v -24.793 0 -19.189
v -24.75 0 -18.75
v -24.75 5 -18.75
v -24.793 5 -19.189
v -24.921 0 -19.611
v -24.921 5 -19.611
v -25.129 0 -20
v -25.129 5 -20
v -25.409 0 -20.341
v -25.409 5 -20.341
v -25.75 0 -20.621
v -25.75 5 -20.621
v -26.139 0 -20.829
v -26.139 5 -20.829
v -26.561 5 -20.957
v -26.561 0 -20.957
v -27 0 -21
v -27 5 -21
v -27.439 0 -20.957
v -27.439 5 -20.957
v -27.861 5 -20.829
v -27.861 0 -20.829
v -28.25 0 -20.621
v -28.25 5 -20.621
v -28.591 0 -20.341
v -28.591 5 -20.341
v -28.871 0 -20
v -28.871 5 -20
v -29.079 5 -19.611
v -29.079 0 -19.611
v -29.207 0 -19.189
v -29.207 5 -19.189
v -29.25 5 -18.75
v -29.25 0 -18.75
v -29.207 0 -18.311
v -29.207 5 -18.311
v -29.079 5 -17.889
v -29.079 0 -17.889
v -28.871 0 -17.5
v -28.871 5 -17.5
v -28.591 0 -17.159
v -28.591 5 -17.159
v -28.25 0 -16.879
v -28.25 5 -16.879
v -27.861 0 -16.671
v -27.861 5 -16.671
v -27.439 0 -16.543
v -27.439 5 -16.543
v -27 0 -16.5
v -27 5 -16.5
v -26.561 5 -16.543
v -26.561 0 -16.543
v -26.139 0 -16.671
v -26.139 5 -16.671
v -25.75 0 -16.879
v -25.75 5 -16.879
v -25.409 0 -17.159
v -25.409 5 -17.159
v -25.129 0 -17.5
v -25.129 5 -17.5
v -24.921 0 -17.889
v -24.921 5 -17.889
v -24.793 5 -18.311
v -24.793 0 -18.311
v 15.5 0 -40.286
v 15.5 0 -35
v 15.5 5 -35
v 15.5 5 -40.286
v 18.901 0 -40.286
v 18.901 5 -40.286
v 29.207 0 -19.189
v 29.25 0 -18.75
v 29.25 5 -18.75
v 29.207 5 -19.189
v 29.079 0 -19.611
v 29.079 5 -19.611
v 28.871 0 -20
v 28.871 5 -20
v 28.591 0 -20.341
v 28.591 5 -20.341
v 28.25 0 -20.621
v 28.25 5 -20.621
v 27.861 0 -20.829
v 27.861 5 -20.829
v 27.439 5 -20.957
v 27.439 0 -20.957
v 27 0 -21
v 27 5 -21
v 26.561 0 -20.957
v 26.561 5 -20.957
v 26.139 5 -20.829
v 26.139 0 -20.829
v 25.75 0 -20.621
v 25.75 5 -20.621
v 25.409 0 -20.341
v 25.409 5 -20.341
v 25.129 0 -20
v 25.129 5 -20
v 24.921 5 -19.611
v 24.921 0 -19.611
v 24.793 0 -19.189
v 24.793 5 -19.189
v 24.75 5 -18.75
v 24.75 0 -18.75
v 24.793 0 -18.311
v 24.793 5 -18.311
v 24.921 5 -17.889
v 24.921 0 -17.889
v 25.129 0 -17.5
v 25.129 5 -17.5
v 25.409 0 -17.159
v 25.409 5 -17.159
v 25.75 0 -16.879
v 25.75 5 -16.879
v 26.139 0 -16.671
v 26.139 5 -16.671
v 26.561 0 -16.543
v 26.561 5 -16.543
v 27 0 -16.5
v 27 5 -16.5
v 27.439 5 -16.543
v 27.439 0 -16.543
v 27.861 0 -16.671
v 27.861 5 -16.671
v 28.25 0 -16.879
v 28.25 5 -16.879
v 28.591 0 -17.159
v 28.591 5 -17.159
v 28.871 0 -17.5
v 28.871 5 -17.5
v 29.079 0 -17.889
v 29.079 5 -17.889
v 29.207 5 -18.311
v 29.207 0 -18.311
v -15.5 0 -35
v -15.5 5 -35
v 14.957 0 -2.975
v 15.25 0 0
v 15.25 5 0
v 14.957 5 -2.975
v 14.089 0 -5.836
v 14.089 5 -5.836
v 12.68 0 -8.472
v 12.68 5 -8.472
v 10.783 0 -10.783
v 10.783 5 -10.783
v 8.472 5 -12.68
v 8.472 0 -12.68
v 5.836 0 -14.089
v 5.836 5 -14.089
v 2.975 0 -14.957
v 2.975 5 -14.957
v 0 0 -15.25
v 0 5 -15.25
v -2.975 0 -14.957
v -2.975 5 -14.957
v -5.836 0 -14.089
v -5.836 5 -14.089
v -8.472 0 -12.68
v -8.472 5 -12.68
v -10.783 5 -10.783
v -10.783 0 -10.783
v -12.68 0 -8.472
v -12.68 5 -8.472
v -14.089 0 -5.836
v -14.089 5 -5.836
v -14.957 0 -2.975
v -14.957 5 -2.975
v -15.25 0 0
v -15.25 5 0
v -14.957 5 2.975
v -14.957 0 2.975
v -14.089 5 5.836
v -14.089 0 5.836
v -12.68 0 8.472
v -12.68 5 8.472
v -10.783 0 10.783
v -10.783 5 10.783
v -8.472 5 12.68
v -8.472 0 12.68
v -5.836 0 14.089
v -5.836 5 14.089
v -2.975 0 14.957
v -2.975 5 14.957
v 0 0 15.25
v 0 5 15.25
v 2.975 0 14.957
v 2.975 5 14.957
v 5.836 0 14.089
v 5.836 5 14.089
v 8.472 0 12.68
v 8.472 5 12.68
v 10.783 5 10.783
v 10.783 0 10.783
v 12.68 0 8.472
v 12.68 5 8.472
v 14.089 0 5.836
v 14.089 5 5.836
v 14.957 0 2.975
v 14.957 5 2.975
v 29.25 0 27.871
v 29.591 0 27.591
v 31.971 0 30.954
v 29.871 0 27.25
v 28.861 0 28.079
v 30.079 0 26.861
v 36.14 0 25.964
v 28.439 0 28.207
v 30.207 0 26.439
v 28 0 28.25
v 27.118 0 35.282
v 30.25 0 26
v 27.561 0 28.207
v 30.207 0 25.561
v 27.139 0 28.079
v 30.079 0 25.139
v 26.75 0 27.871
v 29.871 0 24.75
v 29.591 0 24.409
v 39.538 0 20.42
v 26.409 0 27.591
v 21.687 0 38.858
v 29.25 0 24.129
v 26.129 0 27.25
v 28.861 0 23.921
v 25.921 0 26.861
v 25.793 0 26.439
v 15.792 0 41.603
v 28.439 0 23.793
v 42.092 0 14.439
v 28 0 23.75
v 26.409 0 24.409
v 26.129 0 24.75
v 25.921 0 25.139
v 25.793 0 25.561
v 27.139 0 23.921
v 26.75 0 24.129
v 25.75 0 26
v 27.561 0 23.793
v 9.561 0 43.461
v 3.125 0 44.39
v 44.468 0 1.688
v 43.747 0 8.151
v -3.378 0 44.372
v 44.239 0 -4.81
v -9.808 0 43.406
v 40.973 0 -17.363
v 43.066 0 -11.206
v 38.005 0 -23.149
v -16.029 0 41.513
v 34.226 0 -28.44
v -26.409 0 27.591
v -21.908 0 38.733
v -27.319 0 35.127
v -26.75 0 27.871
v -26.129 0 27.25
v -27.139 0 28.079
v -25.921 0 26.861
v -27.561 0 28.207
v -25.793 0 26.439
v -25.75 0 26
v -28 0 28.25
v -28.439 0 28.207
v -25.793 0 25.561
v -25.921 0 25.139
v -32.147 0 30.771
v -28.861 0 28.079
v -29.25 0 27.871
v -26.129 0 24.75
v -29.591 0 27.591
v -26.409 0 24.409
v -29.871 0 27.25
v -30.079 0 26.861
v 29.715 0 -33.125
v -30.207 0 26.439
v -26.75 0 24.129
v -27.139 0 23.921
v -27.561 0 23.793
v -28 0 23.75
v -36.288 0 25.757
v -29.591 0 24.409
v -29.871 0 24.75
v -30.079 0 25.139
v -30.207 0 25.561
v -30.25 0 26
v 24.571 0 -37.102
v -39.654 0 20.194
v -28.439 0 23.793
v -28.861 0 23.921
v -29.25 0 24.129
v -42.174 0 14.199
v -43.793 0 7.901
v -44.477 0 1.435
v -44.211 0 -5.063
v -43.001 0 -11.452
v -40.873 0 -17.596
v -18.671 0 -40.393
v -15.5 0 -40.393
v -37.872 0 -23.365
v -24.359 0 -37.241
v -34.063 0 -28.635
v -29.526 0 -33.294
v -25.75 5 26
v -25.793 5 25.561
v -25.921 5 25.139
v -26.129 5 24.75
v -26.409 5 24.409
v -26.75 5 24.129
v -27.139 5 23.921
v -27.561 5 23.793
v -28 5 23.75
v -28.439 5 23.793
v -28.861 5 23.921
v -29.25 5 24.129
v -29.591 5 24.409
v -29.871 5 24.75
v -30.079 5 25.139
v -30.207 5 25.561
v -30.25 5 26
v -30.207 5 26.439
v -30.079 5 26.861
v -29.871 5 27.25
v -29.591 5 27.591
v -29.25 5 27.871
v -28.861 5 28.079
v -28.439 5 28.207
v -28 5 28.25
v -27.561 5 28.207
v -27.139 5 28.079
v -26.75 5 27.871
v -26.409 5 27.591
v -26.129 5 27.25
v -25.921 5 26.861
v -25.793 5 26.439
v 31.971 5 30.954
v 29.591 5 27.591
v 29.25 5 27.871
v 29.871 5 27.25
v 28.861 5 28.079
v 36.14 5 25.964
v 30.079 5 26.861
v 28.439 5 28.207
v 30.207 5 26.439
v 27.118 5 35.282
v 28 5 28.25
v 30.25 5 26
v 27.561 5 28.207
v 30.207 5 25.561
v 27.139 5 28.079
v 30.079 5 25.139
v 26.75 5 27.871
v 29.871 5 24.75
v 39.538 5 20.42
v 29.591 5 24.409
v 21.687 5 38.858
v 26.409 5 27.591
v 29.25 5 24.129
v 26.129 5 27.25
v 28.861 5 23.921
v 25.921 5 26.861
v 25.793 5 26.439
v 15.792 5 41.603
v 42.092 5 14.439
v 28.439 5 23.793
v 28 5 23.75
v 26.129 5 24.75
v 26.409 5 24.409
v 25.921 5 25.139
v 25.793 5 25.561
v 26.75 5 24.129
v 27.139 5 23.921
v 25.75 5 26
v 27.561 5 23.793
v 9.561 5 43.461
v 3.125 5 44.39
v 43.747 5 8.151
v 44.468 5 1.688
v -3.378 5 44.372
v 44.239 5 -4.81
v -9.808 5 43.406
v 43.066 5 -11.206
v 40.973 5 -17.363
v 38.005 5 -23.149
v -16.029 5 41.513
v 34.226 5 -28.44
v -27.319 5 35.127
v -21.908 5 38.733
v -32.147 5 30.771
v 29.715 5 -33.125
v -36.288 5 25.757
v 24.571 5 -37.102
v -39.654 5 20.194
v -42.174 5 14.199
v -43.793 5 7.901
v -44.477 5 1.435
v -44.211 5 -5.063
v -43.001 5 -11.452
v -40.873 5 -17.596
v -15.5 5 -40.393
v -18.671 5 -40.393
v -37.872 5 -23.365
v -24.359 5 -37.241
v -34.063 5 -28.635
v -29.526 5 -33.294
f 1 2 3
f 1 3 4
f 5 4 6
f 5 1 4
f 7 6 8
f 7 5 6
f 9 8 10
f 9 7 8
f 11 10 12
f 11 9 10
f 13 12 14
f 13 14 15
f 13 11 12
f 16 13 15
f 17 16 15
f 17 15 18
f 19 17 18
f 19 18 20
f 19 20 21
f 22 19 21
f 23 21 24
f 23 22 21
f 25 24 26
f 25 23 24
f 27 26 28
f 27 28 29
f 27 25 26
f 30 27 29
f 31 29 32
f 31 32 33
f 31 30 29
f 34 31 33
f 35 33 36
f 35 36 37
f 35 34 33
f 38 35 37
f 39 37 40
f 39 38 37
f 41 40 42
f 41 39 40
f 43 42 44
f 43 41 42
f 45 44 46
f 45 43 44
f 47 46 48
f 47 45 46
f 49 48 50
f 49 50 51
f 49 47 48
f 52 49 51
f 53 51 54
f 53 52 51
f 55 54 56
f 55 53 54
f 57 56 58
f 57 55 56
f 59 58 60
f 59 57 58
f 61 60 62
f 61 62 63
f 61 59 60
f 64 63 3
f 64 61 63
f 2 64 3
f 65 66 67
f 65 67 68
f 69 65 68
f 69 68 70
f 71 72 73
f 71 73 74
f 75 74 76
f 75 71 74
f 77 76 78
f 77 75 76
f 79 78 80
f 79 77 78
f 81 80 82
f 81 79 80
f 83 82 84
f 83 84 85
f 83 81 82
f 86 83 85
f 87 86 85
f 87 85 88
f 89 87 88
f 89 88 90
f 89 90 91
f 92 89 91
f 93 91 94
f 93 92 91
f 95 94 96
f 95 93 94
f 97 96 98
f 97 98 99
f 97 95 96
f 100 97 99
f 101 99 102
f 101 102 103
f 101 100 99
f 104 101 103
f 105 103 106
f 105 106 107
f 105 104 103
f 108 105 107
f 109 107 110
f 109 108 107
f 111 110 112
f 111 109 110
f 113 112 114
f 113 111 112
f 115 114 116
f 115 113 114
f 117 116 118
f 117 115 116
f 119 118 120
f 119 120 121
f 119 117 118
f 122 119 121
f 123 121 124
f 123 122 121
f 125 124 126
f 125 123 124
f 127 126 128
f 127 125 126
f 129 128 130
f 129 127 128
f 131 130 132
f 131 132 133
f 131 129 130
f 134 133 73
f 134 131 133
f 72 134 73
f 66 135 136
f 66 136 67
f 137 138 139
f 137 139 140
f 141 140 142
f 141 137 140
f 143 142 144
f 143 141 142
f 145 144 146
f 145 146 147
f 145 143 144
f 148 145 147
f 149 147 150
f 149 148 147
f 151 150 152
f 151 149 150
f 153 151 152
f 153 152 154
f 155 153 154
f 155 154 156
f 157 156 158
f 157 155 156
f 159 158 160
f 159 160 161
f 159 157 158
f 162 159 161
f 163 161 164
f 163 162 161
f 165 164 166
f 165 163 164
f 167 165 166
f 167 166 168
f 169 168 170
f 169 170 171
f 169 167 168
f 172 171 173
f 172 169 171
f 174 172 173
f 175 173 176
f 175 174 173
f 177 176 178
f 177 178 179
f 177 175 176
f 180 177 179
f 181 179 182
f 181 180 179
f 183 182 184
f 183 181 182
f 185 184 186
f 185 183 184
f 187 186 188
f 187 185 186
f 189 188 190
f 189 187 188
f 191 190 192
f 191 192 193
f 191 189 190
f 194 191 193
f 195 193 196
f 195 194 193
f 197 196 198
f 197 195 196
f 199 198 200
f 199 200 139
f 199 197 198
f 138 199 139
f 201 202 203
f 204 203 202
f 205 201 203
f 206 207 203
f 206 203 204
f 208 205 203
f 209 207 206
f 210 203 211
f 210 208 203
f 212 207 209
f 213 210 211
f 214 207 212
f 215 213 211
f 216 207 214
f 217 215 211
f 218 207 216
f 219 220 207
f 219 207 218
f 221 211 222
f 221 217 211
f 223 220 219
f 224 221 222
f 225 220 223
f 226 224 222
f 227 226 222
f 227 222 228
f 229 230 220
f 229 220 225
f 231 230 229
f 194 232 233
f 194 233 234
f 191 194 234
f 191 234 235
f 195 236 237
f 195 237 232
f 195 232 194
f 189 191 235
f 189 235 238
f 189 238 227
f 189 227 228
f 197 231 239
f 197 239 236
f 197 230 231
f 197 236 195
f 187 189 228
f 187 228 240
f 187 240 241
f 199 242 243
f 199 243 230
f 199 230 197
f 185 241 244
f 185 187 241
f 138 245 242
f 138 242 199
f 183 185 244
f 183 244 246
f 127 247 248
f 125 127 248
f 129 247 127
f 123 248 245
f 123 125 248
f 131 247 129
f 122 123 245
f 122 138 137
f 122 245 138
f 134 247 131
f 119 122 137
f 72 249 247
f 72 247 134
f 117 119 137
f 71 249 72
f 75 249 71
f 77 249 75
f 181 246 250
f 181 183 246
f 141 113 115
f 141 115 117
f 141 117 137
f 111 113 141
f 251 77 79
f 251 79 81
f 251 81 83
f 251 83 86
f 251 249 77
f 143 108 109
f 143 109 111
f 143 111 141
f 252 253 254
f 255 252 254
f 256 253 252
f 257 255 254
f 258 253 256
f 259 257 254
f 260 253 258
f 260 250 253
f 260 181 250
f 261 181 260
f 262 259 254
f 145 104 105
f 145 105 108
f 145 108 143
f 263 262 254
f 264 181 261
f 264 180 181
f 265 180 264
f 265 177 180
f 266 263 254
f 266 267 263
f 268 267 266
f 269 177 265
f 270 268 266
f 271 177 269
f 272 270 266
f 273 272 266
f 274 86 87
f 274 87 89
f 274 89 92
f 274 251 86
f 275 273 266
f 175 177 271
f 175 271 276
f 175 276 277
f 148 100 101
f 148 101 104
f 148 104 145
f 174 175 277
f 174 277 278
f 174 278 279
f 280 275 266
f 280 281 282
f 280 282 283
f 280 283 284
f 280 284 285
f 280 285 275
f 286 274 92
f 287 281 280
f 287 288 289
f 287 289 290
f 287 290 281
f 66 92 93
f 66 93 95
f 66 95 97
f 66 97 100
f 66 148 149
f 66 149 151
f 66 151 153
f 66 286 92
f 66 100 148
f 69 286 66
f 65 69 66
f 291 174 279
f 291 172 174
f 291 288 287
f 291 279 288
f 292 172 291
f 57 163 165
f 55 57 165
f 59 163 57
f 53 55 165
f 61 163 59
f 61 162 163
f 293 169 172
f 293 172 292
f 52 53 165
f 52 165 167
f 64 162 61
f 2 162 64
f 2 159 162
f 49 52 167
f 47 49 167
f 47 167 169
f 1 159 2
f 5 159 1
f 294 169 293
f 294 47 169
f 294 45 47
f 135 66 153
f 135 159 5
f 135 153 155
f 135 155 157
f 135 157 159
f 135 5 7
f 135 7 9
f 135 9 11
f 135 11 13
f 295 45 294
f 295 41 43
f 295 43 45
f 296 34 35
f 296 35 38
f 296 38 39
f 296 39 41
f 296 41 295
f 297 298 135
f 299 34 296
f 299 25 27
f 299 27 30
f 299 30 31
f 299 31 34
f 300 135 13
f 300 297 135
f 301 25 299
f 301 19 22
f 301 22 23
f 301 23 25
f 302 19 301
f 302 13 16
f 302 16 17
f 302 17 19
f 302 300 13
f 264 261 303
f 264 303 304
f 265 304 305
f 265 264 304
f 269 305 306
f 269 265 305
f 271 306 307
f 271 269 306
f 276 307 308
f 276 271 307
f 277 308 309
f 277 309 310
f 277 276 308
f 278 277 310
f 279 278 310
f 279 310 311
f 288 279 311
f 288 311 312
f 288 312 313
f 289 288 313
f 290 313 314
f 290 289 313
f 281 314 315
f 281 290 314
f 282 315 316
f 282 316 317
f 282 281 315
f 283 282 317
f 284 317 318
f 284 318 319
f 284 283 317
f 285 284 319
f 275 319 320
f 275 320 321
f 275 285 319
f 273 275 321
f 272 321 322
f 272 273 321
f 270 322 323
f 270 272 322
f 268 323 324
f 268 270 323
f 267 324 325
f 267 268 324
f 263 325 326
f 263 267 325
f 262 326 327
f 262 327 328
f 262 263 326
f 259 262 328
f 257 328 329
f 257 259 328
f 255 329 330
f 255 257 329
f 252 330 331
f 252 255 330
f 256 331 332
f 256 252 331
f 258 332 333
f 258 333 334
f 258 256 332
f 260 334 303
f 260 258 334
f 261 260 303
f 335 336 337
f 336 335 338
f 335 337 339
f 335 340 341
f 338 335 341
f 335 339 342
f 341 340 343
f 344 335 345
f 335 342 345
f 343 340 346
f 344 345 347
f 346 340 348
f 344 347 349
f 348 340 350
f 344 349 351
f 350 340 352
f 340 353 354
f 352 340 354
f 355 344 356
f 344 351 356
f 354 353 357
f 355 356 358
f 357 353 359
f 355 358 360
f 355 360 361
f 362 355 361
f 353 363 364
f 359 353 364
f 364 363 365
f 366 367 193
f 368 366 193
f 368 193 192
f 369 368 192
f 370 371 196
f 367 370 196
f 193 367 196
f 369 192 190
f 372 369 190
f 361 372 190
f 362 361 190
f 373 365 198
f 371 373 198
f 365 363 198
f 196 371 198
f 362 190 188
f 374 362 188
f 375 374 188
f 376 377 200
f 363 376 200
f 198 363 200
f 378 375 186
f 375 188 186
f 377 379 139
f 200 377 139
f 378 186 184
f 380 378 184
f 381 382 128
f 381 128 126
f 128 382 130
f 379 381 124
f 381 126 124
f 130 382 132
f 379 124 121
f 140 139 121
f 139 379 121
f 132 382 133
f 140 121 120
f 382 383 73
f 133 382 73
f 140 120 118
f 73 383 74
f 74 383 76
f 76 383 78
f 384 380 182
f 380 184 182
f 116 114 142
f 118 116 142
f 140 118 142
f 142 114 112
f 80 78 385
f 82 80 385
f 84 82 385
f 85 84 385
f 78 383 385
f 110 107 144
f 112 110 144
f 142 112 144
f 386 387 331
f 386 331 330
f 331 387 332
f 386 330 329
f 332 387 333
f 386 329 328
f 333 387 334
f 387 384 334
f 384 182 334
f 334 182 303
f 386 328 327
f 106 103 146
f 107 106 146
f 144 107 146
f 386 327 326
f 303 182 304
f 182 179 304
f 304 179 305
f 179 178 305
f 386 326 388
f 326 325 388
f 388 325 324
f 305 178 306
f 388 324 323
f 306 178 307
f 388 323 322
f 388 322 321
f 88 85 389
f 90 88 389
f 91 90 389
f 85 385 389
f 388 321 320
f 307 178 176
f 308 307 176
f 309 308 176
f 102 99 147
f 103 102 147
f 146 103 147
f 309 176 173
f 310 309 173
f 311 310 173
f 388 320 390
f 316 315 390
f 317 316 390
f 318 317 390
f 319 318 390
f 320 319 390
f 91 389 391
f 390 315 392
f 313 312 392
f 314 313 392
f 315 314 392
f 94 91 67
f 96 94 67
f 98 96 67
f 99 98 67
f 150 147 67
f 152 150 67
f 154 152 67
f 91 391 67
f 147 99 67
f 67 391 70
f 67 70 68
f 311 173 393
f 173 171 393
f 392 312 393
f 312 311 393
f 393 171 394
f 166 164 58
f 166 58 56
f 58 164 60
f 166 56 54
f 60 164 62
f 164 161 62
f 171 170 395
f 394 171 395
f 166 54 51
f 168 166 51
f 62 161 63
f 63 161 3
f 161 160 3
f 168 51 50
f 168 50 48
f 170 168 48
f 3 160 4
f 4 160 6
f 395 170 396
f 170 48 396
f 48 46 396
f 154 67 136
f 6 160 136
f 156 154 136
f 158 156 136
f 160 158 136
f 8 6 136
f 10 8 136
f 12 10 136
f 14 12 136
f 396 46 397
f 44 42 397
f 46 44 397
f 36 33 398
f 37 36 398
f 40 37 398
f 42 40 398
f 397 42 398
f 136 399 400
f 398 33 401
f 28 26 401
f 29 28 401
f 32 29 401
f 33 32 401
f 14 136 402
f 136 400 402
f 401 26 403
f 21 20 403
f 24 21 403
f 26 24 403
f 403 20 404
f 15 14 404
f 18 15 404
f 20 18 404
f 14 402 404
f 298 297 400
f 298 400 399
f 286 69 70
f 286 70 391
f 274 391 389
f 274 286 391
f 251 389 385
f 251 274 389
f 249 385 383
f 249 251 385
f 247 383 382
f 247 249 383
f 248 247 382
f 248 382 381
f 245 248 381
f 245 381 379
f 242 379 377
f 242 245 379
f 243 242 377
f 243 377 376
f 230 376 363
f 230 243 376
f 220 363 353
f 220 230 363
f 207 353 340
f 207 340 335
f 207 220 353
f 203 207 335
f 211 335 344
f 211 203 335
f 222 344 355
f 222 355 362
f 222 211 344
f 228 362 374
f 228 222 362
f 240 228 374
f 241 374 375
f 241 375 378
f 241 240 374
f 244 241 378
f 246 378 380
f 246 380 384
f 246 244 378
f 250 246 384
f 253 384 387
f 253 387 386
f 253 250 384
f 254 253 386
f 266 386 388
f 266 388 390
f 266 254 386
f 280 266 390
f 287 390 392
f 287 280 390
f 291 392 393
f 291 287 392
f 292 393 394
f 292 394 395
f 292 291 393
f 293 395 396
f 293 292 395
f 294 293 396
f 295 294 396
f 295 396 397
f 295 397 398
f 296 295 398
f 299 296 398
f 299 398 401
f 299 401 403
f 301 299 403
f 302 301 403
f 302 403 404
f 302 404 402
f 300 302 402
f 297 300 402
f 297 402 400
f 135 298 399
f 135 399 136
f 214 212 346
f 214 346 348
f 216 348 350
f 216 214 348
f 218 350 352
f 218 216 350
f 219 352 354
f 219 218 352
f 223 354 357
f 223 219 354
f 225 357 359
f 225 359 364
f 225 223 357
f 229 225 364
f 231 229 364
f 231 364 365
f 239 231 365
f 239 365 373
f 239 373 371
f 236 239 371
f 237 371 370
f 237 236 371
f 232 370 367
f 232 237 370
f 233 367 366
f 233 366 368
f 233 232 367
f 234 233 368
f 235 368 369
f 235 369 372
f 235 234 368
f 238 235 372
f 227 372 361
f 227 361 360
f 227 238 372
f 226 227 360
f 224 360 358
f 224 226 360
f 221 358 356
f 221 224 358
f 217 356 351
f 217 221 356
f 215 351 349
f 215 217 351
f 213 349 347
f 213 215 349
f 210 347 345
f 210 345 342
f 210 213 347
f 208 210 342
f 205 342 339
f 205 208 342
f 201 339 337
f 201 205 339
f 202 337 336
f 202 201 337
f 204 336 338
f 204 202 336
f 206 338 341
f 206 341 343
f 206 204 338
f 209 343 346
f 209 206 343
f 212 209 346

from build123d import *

# Parameters (mm, degrees)
SKETCH_2_R      = 15.25
SKETCH_2_R_2    = 2.25
EXTRUDE_1_DEPTH = 5


with BuildPart() as part:
    # Эскиз2 → Бобышка-Вытянуть1 (new body)
    with BuildSketch(Plane(origin=(0, 0, 0), x_dir=(1, 0, 0), z_dir=(0, 1, 0))):
        with BuildLine():
            Line((-15.5, 35), (15.5, 35))
            Line((15.5, 35), (15.5, 40.286336603))
            Line((15.5, 40.286336603), (18.901351356, 40.286336603))
            ThreePointArc((18.901351356, 40.286336603), (-0.126903456, -44.49981905), (-18.671270685, 40.393485254))
            Line((-18.671270685, 40.393485254), (-15.5, 40.393485254))
            Line((-15.5, 40.393485254), (-15.5, 35))
        make_face()
        Circle(SKETCH_2_R, mode=Mode.SUBTRACT)
        with Locations((-27, 18.75)):
            Circle(SKETCH_2_R_2, mode=Mode.SUBTRACT)
        with Locations((27, 18.75)):
            Circle(SKETCH_2_R_2, mode=Mode.SUBTRACT)
        with Locations((28, -26)):
            Circle(SKETCH_2_R_2, mode=Mode.SUBTRACT)
        with Locations((-28, -26)):
            Circle(SKETCH_2_R_2, mode=Mode.SUBTRACT)
    extrude(amount=EXTRUDE_1_DEPTH)


solid = part.part
